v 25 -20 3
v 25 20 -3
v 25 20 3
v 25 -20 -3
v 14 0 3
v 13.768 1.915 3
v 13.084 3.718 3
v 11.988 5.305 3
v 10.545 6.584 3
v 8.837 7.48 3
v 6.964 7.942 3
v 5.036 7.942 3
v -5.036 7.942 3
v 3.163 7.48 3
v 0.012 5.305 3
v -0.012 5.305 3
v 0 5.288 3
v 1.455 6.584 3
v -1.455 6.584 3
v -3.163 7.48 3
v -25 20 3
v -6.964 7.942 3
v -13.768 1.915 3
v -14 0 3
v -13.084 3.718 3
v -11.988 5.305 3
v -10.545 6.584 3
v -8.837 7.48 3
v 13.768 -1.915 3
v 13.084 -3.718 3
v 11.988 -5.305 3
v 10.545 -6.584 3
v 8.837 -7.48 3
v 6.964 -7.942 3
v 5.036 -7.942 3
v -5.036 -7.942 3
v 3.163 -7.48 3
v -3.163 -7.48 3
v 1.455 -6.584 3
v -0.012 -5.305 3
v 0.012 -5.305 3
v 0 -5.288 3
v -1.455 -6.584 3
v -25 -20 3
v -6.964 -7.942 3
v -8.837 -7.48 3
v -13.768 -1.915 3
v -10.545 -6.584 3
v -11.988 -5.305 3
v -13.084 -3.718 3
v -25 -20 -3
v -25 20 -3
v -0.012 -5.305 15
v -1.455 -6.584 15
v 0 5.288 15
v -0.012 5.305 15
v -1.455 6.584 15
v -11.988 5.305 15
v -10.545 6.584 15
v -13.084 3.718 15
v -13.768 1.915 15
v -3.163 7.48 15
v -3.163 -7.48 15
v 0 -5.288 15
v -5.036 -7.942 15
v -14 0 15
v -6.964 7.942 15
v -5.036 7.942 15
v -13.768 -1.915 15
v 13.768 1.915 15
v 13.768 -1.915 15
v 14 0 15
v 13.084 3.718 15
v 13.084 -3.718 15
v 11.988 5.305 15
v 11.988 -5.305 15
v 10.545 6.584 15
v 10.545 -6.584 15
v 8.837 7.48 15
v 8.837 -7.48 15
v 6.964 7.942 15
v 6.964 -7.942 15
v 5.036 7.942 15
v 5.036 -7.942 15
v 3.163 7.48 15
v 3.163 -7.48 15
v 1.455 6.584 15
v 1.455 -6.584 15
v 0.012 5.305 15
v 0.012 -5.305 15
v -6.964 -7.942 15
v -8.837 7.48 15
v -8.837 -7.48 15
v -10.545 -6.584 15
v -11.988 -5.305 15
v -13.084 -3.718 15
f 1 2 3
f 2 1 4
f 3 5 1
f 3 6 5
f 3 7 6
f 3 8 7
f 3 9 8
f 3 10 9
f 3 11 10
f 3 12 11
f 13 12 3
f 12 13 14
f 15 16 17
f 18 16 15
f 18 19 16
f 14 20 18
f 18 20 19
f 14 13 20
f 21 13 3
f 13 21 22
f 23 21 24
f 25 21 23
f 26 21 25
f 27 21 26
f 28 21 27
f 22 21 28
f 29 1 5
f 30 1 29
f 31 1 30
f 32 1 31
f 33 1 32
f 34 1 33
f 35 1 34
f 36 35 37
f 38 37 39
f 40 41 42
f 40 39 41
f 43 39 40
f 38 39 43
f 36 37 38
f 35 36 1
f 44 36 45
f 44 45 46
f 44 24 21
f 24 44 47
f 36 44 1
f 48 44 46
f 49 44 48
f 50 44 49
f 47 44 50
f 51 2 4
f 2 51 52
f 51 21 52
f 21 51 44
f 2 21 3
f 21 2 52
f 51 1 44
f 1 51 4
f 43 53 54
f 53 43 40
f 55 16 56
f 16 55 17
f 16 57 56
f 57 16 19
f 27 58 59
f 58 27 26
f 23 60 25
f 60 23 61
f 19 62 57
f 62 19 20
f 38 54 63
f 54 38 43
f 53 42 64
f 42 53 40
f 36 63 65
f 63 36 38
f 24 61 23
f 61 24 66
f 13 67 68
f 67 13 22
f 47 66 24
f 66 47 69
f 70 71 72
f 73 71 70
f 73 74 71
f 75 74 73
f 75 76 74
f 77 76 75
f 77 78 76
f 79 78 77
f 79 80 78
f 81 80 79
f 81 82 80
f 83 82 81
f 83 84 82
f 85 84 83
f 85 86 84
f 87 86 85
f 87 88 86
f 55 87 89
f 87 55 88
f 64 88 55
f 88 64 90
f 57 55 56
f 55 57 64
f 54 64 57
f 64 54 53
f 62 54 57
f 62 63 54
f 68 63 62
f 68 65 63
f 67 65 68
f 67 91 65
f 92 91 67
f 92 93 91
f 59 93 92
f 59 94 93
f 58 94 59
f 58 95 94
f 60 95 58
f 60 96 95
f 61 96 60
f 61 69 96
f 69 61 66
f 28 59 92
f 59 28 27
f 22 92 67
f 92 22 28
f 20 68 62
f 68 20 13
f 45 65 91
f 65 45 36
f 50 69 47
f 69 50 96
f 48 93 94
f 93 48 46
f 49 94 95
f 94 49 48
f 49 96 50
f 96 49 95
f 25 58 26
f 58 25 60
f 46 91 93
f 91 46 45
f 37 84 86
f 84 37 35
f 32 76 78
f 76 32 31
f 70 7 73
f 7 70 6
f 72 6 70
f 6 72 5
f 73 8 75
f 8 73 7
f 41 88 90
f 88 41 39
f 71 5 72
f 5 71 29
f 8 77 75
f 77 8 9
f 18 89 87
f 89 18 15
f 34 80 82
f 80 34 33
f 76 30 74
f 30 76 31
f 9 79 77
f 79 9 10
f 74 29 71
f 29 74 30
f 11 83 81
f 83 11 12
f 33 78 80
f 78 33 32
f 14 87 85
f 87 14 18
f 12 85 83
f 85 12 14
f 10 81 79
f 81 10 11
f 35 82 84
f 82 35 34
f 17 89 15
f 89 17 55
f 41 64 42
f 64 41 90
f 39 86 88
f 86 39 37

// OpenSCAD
// Two overlapping bosses on a plate. Their shared seam meeting the plate is
// where D13's hole was; it is also a wiki figure and must be clean.
FNSET = 0; $fn = FNSET;
R = 1.5;
union() {
    cube([50, 40, 6], center = true);
    translate([-6, 0, 3]) cylinder(d = 16, h = 12);
    translate([ 6, 0, 3]) cylinder(d = 16, h = 12);
}
